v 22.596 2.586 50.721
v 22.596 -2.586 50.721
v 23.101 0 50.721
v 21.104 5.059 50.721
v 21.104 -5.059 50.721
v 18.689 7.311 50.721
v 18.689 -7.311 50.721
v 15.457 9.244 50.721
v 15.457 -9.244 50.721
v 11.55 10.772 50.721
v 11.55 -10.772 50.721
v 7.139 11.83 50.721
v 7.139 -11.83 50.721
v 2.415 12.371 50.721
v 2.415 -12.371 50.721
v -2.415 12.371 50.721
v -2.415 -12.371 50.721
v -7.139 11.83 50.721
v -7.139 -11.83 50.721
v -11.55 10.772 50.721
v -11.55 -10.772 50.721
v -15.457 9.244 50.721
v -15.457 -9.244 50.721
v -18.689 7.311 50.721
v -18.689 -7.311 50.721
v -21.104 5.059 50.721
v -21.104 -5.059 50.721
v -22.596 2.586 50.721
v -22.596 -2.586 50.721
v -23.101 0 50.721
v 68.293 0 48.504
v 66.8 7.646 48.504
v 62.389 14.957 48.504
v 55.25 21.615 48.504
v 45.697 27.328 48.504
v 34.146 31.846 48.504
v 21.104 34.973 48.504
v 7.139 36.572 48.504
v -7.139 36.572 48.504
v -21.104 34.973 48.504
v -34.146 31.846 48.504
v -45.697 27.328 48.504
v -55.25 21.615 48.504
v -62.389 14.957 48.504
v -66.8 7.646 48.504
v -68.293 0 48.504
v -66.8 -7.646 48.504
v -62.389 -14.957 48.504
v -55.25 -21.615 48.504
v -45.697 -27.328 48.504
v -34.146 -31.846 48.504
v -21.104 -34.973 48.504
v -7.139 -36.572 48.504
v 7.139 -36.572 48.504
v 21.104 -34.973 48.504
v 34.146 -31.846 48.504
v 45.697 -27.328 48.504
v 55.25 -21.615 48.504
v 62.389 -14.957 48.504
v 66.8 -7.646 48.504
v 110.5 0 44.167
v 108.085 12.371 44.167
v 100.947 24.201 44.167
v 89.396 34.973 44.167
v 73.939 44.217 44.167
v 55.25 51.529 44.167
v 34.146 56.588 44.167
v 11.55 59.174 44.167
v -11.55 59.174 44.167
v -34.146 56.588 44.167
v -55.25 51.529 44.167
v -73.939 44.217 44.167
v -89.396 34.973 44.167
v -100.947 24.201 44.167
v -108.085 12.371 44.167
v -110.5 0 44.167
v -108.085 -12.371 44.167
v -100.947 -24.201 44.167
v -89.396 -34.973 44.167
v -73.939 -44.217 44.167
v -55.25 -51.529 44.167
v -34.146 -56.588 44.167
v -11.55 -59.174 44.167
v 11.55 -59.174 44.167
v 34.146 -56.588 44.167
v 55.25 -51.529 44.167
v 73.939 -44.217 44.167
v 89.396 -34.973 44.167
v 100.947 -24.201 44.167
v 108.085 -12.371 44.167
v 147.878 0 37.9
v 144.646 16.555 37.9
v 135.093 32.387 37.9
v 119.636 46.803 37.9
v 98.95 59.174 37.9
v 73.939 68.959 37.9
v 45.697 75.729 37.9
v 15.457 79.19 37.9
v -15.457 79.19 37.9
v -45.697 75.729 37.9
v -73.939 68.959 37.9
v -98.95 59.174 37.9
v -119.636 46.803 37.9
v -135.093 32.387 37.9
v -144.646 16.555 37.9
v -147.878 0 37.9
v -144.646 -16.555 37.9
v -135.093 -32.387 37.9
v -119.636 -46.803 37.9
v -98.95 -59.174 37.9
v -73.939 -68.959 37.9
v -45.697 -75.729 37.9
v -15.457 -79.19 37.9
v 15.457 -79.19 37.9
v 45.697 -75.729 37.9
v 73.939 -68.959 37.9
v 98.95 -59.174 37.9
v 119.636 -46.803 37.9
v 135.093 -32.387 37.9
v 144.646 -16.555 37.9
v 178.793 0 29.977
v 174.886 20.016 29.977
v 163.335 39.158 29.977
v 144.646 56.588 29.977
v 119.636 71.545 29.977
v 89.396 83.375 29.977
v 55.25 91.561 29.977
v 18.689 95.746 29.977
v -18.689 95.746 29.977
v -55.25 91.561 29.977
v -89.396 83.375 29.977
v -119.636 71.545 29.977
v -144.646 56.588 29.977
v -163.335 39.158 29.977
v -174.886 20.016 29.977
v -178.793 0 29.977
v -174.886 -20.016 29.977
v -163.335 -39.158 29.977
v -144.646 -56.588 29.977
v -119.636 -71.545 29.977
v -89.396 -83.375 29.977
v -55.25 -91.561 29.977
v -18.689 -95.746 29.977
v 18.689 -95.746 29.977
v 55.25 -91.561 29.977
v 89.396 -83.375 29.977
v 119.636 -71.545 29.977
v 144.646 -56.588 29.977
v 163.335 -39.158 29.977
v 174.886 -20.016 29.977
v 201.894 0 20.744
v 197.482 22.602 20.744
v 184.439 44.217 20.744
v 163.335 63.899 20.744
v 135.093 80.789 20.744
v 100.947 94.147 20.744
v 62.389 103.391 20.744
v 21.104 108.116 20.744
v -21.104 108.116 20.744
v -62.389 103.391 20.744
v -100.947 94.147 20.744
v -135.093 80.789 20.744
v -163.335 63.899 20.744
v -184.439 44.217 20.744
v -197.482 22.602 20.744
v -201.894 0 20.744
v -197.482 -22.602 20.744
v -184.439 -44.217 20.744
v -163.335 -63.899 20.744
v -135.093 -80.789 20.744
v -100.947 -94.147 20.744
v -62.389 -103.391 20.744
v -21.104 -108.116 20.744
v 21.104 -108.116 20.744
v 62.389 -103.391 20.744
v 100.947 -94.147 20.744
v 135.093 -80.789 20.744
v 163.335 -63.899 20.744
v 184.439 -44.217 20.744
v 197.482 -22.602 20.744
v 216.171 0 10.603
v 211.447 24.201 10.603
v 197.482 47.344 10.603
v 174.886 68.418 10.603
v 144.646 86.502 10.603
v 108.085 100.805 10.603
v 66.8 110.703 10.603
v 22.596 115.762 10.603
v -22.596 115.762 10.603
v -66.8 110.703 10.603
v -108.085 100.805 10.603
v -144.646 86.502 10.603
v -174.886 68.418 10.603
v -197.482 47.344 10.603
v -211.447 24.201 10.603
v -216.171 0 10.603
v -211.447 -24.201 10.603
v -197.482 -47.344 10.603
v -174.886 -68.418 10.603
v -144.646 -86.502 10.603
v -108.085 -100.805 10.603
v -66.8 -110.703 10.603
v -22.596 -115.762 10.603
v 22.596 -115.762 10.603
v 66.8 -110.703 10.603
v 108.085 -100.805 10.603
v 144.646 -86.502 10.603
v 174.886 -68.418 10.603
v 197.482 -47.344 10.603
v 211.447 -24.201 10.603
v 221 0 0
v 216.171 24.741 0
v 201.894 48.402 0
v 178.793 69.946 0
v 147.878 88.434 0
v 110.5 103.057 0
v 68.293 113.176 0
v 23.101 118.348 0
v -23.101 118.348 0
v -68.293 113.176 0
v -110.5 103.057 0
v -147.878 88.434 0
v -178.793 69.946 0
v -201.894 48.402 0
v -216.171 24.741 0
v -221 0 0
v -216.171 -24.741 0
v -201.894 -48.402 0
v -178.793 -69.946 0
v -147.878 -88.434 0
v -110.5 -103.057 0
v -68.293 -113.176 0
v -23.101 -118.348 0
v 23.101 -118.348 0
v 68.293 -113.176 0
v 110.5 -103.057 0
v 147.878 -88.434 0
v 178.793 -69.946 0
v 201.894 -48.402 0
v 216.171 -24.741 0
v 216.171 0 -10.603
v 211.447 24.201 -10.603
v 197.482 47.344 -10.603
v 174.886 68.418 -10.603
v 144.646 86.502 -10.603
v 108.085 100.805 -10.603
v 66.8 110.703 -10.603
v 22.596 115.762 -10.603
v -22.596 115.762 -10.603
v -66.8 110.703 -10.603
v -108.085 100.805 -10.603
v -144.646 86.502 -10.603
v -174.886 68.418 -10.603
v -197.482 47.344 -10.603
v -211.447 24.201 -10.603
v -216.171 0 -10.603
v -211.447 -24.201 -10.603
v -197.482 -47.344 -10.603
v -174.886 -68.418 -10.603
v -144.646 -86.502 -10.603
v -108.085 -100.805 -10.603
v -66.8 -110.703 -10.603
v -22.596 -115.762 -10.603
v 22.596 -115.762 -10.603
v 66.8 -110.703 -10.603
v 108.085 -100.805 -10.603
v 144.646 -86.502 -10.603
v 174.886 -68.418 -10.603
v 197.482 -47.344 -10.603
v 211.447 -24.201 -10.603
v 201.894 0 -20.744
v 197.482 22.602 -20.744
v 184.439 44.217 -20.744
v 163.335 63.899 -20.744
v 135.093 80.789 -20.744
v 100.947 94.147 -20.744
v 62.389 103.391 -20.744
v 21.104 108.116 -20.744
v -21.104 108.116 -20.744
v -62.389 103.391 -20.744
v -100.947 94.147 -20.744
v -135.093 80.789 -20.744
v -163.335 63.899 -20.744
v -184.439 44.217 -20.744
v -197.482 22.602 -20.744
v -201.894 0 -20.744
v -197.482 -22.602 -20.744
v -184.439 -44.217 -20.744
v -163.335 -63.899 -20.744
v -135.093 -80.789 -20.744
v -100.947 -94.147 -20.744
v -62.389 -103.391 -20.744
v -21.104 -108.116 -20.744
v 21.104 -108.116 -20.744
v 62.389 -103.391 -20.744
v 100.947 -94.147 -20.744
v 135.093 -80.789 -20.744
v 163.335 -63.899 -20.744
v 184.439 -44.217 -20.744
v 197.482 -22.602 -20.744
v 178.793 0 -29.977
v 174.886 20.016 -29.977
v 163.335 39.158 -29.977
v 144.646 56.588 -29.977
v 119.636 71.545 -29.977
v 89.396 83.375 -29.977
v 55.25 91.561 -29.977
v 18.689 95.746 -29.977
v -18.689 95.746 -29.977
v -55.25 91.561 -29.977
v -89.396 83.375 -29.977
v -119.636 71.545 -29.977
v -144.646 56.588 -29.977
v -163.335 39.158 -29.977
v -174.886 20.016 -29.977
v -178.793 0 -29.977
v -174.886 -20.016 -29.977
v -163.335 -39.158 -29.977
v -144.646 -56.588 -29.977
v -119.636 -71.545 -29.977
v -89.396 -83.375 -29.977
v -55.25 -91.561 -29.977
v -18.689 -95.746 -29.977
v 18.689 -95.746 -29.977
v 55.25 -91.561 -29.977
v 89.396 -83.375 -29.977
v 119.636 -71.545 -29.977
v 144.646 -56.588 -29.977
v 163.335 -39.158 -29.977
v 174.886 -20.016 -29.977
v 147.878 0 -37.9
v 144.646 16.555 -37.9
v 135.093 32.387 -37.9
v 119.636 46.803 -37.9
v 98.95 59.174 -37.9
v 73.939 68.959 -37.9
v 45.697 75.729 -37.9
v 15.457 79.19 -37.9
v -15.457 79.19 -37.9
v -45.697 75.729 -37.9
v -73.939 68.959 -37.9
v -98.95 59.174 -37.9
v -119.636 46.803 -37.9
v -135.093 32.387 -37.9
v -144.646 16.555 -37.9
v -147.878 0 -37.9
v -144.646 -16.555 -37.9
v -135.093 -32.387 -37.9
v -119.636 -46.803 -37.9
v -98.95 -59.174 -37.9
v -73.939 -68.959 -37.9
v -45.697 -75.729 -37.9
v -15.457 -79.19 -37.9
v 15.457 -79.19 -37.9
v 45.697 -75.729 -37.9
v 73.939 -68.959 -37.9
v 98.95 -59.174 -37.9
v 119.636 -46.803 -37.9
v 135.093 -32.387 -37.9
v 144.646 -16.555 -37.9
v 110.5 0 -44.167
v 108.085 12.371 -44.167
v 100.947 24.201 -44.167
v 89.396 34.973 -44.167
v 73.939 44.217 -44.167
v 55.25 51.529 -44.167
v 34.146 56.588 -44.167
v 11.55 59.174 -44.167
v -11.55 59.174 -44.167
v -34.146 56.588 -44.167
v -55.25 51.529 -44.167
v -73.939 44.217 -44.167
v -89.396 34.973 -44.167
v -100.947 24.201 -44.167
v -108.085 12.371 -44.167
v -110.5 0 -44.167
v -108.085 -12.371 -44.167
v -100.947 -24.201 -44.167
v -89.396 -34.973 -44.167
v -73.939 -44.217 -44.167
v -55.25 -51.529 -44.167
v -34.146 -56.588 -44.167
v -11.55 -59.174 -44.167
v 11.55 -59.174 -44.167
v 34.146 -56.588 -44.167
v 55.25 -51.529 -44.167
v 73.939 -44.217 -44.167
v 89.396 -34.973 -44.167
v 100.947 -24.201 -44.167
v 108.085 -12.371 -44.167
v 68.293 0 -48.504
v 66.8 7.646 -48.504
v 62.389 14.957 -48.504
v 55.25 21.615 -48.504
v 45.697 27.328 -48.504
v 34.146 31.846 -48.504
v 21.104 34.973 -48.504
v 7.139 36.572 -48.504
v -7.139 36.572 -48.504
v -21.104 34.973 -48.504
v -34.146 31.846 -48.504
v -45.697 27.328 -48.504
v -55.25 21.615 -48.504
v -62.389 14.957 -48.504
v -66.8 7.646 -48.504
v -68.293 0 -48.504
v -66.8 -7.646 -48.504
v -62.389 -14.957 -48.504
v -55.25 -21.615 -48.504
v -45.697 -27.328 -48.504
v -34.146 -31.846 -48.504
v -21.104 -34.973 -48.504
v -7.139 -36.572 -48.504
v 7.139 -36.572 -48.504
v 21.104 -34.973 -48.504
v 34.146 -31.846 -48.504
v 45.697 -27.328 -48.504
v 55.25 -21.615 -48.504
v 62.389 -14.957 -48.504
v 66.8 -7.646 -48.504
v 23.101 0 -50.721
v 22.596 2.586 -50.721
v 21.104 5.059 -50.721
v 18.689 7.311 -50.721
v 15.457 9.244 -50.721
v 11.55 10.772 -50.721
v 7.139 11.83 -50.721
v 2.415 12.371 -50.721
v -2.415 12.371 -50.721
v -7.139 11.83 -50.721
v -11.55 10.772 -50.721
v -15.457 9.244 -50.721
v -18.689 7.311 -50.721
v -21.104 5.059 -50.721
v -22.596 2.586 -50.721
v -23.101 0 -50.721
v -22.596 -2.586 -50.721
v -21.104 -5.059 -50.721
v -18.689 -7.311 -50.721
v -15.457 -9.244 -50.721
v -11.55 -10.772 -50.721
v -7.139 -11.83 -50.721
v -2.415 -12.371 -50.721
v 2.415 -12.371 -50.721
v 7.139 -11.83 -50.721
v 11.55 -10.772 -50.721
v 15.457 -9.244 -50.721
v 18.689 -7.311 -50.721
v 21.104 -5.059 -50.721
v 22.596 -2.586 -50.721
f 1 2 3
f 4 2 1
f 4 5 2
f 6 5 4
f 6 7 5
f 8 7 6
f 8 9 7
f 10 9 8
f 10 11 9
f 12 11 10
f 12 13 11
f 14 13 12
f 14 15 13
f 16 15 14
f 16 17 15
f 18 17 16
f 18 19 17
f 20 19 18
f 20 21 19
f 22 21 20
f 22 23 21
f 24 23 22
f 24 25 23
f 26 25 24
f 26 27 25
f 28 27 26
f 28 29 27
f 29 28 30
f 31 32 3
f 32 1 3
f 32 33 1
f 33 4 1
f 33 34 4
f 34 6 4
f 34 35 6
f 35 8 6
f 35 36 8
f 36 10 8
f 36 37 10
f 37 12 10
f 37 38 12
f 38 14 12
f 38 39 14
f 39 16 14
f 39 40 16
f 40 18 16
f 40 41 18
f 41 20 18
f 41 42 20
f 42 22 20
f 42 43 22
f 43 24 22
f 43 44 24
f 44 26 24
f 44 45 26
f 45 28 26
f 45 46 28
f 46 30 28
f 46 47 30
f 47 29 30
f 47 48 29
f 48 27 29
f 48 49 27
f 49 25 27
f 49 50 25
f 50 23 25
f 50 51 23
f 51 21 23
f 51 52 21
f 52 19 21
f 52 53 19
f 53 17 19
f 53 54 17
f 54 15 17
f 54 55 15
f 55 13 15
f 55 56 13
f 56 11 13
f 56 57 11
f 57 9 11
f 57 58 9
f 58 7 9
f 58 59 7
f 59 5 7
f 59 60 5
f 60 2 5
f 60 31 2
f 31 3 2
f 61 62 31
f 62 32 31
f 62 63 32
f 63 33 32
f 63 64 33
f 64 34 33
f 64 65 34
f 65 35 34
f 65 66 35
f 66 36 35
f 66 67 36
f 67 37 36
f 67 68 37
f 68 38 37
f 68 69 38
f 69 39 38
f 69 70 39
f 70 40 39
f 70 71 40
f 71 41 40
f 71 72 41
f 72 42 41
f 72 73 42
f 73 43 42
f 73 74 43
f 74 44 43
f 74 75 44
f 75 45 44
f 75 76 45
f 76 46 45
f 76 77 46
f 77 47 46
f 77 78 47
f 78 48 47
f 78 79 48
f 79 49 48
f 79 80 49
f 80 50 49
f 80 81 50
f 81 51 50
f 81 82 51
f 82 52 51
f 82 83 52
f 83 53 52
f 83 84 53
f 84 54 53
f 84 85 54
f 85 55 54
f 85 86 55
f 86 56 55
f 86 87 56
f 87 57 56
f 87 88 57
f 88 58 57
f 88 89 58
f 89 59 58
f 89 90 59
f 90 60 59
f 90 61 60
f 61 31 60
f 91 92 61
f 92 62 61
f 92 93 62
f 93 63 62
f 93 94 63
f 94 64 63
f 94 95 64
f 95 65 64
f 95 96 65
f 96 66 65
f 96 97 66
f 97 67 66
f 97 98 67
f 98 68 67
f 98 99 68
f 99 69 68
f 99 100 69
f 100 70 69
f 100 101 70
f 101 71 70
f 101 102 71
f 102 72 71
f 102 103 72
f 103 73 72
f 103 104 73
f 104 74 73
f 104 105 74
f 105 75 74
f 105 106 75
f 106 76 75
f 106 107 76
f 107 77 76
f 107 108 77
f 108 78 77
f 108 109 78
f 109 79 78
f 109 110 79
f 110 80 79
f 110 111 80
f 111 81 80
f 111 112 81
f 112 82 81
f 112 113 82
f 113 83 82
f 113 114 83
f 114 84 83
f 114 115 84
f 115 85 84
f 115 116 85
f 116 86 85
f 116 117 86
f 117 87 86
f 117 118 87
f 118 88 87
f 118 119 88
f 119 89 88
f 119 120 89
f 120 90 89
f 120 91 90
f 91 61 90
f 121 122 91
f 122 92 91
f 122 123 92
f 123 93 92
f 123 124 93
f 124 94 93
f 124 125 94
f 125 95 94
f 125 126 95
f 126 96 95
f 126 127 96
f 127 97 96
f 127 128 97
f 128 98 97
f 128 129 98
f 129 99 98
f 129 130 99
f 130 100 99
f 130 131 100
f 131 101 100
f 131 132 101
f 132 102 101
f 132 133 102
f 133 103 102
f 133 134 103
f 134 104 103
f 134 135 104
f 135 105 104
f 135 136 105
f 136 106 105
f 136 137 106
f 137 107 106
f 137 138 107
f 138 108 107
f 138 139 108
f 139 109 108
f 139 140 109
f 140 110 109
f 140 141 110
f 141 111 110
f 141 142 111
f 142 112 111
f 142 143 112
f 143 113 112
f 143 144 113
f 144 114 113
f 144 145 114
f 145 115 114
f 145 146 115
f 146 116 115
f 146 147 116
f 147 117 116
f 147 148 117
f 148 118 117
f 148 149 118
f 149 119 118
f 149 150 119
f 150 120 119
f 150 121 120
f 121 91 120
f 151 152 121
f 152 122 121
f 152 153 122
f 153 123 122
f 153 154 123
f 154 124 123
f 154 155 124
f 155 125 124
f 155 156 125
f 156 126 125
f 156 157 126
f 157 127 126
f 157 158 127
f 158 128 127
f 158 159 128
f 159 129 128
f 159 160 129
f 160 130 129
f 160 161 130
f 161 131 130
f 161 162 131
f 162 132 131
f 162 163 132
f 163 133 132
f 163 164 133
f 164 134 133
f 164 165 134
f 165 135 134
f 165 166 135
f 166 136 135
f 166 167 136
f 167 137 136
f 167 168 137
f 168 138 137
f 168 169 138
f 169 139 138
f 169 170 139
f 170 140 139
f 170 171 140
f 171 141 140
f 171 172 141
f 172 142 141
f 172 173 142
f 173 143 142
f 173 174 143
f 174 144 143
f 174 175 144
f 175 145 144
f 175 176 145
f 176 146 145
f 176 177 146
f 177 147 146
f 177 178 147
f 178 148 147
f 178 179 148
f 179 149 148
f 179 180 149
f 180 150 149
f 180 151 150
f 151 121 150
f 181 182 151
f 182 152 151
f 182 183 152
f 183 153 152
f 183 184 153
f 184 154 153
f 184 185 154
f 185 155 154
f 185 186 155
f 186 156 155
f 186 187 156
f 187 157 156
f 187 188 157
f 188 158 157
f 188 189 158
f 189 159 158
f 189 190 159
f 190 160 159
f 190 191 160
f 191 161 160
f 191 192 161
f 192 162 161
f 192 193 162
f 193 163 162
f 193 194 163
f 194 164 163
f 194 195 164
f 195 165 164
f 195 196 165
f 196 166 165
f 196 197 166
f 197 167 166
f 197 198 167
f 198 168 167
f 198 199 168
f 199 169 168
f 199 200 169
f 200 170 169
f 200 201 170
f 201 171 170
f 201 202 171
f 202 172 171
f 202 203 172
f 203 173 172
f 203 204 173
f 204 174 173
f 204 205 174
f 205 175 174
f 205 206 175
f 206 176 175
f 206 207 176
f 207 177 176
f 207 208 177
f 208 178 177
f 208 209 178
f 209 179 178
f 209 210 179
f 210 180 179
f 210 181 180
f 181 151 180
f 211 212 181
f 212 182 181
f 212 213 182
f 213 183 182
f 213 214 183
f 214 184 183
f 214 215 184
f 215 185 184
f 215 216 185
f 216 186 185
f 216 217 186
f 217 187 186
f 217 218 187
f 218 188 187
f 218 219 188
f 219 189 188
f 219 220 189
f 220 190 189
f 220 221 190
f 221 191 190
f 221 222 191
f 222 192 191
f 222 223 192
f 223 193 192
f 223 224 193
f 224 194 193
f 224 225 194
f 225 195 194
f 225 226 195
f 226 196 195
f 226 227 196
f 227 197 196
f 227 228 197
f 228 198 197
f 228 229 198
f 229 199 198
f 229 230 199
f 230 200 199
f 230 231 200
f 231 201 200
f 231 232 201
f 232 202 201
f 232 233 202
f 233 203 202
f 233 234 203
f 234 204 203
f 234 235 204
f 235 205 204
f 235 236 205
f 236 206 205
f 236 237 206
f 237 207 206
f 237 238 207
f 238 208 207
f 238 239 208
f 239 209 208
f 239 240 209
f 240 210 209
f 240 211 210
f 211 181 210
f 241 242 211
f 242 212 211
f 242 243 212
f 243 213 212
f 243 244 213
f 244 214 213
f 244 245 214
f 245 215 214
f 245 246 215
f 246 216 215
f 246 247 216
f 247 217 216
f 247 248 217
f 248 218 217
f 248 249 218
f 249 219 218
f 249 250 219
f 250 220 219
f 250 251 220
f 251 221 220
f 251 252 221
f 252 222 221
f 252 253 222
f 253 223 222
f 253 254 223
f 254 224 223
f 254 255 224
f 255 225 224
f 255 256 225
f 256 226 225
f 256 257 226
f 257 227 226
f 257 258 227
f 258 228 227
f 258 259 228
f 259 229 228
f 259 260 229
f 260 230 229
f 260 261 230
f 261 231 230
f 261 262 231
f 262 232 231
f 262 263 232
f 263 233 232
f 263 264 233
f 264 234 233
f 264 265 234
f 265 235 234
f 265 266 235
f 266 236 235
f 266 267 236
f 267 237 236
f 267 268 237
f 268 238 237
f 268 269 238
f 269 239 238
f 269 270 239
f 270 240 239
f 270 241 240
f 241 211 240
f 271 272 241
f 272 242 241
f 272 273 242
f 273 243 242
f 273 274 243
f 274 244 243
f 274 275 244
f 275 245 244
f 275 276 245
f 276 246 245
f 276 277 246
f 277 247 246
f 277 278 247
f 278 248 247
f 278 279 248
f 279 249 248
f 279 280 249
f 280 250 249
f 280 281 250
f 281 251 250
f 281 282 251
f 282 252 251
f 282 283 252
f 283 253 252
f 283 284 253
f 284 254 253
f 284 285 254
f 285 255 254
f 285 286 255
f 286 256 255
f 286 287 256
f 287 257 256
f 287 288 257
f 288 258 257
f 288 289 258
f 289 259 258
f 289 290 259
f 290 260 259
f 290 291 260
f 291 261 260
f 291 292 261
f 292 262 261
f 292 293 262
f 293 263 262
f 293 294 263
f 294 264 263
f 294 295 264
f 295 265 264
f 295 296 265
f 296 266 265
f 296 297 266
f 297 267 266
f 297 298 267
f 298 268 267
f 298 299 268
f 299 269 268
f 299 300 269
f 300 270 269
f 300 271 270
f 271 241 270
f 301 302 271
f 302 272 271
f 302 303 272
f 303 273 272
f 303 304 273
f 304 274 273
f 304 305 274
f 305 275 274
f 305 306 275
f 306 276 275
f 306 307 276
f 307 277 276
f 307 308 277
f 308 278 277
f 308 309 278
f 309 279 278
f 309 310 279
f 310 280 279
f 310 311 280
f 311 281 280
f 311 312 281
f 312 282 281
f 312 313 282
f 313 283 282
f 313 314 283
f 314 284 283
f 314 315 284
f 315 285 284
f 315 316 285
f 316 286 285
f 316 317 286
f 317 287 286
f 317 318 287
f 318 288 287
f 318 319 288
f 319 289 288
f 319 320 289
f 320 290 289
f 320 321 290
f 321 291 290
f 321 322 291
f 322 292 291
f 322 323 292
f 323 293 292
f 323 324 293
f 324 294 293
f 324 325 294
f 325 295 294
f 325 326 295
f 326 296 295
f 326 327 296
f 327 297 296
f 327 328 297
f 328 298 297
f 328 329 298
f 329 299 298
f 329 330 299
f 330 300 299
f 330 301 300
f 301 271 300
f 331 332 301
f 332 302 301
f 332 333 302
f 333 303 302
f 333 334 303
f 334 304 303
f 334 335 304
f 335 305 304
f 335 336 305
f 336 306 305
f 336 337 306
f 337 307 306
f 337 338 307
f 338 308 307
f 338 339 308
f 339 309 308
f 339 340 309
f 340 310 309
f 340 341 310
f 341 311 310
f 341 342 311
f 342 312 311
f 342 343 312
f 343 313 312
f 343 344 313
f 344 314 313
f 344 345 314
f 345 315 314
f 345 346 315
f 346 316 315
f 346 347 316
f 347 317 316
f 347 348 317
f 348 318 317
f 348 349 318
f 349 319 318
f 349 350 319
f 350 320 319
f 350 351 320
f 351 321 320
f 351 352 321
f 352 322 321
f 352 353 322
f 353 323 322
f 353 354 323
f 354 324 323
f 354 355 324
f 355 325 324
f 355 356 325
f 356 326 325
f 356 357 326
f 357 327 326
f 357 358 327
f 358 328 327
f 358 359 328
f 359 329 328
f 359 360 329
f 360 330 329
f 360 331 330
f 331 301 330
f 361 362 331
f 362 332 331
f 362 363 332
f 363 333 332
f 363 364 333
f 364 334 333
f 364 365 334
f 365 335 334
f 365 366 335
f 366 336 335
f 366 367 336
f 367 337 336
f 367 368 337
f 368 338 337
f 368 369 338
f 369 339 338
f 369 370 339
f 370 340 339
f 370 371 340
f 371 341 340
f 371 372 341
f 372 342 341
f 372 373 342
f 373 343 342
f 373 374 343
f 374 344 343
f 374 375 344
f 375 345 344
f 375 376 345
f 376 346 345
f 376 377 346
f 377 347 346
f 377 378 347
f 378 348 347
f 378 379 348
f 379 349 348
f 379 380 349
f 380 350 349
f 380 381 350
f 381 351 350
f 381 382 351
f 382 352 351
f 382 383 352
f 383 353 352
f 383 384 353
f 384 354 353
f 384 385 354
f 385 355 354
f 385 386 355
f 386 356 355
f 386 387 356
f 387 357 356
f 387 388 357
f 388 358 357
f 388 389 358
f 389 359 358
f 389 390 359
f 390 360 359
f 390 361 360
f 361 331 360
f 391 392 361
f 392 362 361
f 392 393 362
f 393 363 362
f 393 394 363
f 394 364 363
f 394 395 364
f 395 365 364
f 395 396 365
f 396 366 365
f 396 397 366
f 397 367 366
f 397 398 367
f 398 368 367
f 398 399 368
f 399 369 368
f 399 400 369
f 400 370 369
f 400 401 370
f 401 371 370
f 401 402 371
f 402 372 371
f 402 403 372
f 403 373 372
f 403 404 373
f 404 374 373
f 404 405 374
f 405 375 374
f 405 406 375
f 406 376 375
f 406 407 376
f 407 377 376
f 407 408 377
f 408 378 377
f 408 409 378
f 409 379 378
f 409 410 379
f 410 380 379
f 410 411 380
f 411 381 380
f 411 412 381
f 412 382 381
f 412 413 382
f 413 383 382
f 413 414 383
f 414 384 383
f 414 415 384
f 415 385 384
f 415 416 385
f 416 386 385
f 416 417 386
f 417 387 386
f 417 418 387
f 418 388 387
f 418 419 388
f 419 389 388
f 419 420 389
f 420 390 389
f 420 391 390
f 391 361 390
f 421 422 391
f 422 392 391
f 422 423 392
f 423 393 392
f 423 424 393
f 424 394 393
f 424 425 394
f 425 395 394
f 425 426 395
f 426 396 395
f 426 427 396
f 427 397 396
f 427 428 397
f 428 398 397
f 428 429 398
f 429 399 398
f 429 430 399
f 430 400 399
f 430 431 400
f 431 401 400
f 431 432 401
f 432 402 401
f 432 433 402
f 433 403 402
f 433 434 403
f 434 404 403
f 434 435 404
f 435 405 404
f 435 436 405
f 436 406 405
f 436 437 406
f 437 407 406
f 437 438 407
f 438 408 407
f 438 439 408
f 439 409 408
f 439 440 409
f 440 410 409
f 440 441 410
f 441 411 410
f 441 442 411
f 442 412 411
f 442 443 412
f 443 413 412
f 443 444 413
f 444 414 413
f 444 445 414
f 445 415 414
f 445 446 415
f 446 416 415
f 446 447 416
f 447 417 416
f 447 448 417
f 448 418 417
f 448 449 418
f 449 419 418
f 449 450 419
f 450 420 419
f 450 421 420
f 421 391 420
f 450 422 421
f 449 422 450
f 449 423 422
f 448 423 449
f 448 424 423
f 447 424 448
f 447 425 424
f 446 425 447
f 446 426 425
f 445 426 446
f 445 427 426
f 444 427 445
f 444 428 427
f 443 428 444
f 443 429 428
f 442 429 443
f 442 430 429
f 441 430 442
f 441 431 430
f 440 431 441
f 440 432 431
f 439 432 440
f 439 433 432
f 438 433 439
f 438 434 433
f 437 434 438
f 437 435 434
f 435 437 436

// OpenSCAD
// Generated by SolidPython 1.0.1 on 2020-07-29 00:46:50


scale(v = [13, 7, 3]) {
	sphere(r = 17);
}
/***********************************************
*********      SolidPython code:      **********
************************************************
 
# import packages: SolidPython
from solid import *
from solid.utils import *
from itertools import chain, combinations, permutations


class Resize:

    def __init__(self, scad_file):
        self.scad_file = scad_file
        #self.scad_file = import_scad(scad_file)
        # cone/cylinder param:
        self.r1 = 0
        self.r2 = 0
        self.h = 0
        # rectangular prism param:
        self.w = 0
        self.l = 0
        # ellipse param:
        self.r = 0

    # import OpenScad code (file name corresponds to shape)


    # classify shape + parameters
    def assign(self, param1, param2, param3):
        if self.scad_file == 'cone.scad':
            self.r1 = param1
            self.r2 = param2
            self.h = param3
        elif self.scad_file == 'cylinder.scad':
            self.r1 = param1
            self.r2 = param2
            self.h = param3
        elif self.scad_file == 'rectangularPrism.scad':
            self.h = param1
            self.l = param2
            self.w = param3
        else:
            self.r = param1
            self.h = param2

    # resize parameters
    def iterate(self):
        x = range(3, 20, 2)
        i = 1
        if self.scad_file == 'cone.scad':
            tempList = list(permutations(x, 2))
            for temp in tempList:
                param1 = temp[0]
                param2 = temp[1]
                filepath = 'produced_scad_files/' + 'cone' + str(param1) + '_' + str(param2) + '_' + '.scad'
                scad_render_to_file(cylinder(h=param1, r1=param2, r2=0), filepath)

        elif self.scad_file == 'cylinder.scad':
            tempList = list(permutations(x, 3))
            for temp in tempList:
                param1 = temp[0]
                param2 = temp[1]
                filepath = 'produced_scad_files/' + 'cylinder' + str(param1) + '_' + str(param2) + '_' + '.scad'
                scad_render_to_file(cylinder(h=param1, r1=param2, r2=param2), filepath)

        elif self.scad_file == 'rectangularPrism.scad':
            tempList = list(permutations(x, 3))
            for temp in tempList:
                param1 = temp[0]
                param2 = temp[1]
                param3 = temp[2]
                filepath = 'produced_scad_files/' + 'rectangularPrism' + str(param1) + '_' + str(param2) + '_' + str(
                    param3) + '.scad'
                scad_render_to_file(cube(size=(param1, param2, param3)), filepath)

        elif self.scad_file == 'ellipse.scad':
            tempList = list(permutations(x, 4))
            for temp in tempList:
                param1 = temp[0]
                param2 = temp[1]
                param3 = temp[2]
                param4 = temp[3]
                filepath = 'produced_scad_files/' + 'ellipse' + str(param1) + '_' + str(param2) + '_' + str(param3) + '_' + str(param4) + '.scad'
                scad_render_to_file(scale([param1, param2, param3])(sphere(r=param4)), filepath)

    def render_to_scadfile(self):
        scad_render_to_file(scad, 'example.scad') 
 
************************************************/
